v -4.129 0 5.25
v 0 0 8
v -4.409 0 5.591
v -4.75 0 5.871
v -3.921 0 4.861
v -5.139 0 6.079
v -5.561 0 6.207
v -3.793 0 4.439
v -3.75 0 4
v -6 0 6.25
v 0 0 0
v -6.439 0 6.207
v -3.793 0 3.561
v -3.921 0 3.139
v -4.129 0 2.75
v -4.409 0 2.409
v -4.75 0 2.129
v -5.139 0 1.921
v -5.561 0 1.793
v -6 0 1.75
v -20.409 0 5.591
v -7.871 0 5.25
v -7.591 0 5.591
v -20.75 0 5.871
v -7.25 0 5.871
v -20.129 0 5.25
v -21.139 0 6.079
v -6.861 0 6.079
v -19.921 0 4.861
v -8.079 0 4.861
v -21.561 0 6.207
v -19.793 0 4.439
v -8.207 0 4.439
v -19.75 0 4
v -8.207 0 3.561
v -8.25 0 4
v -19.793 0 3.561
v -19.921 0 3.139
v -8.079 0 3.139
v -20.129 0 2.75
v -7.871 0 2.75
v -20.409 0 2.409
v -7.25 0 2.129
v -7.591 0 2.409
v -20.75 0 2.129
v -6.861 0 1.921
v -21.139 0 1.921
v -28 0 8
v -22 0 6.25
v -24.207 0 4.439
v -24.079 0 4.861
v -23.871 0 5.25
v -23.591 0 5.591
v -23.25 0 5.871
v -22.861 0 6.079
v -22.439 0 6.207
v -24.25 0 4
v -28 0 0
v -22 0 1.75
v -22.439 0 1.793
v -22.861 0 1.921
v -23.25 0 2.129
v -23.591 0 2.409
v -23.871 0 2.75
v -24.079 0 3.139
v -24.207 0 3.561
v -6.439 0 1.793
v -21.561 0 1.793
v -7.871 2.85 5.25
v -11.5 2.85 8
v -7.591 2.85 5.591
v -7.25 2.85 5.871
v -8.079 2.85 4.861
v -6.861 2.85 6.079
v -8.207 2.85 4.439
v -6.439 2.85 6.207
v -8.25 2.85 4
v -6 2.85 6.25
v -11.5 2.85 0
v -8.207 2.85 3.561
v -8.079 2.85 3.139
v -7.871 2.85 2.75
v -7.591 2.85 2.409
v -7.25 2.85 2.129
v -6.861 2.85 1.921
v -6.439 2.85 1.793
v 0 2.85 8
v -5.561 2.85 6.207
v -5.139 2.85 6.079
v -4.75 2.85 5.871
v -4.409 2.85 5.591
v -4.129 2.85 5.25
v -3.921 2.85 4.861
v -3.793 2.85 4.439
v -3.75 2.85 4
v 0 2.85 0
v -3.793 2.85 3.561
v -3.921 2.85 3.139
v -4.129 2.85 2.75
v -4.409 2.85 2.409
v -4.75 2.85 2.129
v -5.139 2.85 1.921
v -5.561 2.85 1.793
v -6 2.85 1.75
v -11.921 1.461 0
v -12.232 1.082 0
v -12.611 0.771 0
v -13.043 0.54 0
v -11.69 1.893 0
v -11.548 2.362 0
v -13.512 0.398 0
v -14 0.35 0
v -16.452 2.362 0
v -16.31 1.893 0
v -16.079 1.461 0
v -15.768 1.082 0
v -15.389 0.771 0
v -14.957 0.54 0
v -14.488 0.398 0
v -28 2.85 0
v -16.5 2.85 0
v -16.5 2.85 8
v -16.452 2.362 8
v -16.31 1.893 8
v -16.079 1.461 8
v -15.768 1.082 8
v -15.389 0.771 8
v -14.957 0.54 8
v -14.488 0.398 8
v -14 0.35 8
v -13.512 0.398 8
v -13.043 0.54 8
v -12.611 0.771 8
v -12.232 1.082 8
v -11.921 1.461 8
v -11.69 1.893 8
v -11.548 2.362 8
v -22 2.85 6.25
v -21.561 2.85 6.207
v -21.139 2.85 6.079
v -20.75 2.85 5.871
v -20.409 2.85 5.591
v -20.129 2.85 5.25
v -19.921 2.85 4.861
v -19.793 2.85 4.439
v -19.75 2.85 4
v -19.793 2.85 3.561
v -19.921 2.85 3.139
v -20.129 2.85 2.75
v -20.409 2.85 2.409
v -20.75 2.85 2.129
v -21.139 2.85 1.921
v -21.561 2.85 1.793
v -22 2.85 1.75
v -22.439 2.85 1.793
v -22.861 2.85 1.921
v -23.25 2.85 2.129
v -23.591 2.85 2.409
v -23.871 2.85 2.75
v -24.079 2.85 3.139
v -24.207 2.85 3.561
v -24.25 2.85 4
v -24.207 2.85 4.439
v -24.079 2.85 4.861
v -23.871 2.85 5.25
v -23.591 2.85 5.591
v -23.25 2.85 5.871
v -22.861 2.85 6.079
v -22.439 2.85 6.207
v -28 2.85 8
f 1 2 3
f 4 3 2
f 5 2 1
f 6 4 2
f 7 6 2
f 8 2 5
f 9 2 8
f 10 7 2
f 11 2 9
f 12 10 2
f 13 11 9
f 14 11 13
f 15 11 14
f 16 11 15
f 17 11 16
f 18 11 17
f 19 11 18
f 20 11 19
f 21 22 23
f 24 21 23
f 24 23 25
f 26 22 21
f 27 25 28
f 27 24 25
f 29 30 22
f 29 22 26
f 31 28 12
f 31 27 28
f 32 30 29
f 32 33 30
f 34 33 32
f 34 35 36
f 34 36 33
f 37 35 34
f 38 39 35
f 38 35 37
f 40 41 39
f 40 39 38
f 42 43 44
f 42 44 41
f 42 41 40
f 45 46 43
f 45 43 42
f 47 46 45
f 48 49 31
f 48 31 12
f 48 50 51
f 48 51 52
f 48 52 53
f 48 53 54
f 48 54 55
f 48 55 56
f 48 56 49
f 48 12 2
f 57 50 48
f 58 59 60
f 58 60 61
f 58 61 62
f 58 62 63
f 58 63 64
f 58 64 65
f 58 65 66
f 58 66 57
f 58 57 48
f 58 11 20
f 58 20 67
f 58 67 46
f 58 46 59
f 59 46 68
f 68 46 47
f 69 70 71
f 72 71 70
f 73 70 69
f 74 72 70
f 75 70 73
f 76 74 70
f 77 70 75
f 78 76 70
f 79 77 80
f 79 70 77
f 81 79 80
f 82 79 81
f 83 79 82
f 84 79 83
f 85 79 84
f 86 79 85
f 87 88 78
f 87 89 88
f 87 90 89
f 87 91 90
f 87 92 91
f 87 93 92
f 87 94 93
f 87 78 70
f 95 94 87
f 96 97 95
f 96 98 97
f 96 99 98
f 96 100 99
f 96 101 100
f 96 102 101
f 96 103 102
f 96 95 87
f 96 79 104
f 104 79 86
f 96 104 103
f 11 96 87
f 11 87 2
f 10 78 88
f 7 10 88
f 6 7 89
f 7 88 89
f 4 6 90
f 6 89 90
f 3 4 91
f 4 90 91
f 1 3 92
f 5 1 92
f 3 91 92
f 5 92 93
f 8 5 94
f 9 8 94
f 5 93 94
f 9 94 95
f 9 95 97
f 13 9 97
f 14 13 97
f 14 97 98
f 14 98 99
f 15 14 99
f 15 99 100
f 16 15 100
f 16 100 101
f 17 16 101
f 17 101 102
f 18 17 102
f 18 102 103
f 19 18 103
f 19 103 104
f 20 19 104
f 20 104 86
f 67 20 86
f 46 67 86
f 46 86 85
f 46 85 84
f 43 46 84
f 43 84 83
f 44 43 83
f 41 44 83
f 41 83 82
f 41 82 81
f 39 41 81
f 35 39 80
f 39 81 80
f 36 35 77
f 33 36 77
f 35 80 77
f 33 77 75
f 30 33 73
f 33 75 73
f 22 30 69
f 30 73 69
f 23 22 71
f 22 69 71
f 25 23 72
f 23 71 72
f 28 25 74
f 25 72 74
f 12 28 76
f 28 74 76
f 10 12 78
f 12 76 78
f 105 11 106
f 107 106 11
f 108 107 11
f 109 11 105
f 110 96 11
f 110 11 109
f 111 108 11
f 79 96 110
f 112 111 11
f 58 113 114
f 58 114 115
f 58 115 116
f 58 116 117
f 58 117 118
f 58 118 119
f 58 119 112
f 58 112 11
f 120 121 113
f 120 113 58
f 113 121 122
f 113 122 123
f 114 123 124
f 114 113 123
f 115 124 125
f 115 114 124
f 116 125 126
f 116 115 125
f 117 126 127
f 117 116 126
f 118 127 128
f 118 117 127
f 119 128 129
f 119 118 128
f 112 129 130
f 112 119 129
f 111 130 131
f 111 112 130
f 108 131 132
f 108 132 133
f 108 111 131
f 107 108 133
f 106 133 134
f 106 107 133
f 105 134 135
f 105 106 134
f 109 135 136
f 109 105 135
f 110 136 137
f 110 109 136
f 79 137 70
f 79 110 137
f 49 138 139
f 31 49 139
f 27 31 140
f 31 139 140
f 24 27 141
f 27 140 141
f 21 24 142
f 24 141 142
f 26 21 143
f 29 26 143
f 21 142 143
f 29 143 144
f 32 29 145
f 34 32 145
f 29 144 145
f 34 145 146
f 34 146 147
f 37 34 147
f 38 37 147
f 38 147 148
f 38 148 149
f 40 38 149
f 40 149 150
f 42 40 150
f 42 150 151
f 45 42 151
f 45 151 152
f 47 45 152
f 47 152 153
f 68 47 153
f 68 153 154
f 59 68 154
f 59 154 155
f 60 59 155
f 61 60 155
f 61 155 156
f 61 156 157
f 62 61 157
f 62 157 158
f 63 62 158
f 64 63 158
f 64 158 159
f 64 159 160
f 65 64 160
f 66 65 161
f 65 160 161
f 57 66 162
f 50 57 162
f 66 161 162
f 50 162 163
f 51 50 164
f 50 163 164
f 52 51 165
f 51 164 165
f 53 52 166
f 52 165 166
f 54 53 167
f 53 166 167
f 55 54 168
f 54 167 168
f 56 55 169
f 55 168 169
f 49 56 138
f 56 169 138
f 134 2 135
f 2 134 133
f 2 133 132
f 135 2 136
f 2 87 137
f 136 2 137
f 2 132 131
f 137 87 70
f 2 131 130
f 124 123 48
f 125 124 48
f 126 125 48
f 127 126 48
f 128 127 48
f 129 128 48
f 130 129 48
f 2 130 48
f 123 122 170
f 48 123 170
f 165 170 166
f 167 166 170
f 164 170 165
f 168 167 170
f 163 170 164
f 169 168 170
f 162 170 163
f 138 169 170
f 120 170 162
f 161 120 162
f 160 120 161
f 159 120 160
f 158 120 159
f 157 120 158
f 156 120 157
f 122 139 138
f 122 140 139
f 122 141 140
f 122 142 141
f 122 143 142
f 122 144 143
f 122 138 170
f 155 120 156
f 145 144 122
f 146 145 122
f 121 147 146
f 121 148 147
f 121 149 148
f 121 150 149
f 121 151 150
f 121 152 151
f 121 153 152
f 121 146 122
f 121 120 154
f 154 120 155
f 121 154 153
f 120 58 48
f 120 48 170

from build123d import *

# Parameters (mm, degrees)
BOSS_EXTRUDE1_DEPTH = 8
CUT_EXTRUDE1_REACH  = 31.26
SKETCH2_R           = 2.25


with BuildPart() as part:
    # Sketch1 → Boss-Extrude1 (new body)
    with BuildSketch(Plane.XY):
        with BuildLine():
            Line((0, 0), (-28, 0))
            Line((-28, 0), (-28, 2.85))
            Line((-28, 2.85), (-16.5, 2.85))
            ThreePointArc((-16.5, 2.85), (-14, 0.35), (-11.5, 2.85))
            Line((-11.5, 2.85), (0, 2.85))
            Line((0, 2.85), (0, 0))
        make_face()
    extrude(amount=BOSS_EXTRUDE1_DEPTH)

    # Sketch2 → Cut-Extrude1 (cut, up to next)
    with BuildSketch(Plane(origin=(0, 2.85, 0), x_dir=(1, 0, 0), z_dir=(0, 1, 0)), mode=Mode.PRIVATE) as cut_extrude1_sk1:
        with Locations(Location((-22, -4, 0), (0, 0, 270))):
            Circle(SKETCH2_R)
    cut_extrude1_tool1 = extrude(cut_extrude1_sk1.sketch, amount=-CUT_EXTRUDE1_REACH, mode=Mode.PRIVATE) & part.part
    # Sketch2 → Cut-Extrude1 (cut, up to next)
    with BuildSketch(Plane(origin=(0, 2.85, 0), x_dir=(1, 0, 0), z_dir=(0, 1, 0)), mode=Mode.PRIVATE) as cut_extrude1_sk2:
        with Locations(Location((-6, -4, 0), (0, 0, 270))):
            Circle(SKETCH2_R)
    cut_extrude1_tool2 = extrude(cut_extrude1_sk2.sketch, amount=-CUT_EXTRUDE1_REACH, mode=Mode.PRIVATE) & part.part
    add(cut_extrude1_tool1.solids().sort_by_distance((-22, 2.85, 4))[0], mode=Mode.SUBTRACT)
    add(cut_extrude1_tool2.solids().sort_by_distance((-6, 2.85, 4))[0], mode=Mode.SUBTRACT)


solid = part.part
